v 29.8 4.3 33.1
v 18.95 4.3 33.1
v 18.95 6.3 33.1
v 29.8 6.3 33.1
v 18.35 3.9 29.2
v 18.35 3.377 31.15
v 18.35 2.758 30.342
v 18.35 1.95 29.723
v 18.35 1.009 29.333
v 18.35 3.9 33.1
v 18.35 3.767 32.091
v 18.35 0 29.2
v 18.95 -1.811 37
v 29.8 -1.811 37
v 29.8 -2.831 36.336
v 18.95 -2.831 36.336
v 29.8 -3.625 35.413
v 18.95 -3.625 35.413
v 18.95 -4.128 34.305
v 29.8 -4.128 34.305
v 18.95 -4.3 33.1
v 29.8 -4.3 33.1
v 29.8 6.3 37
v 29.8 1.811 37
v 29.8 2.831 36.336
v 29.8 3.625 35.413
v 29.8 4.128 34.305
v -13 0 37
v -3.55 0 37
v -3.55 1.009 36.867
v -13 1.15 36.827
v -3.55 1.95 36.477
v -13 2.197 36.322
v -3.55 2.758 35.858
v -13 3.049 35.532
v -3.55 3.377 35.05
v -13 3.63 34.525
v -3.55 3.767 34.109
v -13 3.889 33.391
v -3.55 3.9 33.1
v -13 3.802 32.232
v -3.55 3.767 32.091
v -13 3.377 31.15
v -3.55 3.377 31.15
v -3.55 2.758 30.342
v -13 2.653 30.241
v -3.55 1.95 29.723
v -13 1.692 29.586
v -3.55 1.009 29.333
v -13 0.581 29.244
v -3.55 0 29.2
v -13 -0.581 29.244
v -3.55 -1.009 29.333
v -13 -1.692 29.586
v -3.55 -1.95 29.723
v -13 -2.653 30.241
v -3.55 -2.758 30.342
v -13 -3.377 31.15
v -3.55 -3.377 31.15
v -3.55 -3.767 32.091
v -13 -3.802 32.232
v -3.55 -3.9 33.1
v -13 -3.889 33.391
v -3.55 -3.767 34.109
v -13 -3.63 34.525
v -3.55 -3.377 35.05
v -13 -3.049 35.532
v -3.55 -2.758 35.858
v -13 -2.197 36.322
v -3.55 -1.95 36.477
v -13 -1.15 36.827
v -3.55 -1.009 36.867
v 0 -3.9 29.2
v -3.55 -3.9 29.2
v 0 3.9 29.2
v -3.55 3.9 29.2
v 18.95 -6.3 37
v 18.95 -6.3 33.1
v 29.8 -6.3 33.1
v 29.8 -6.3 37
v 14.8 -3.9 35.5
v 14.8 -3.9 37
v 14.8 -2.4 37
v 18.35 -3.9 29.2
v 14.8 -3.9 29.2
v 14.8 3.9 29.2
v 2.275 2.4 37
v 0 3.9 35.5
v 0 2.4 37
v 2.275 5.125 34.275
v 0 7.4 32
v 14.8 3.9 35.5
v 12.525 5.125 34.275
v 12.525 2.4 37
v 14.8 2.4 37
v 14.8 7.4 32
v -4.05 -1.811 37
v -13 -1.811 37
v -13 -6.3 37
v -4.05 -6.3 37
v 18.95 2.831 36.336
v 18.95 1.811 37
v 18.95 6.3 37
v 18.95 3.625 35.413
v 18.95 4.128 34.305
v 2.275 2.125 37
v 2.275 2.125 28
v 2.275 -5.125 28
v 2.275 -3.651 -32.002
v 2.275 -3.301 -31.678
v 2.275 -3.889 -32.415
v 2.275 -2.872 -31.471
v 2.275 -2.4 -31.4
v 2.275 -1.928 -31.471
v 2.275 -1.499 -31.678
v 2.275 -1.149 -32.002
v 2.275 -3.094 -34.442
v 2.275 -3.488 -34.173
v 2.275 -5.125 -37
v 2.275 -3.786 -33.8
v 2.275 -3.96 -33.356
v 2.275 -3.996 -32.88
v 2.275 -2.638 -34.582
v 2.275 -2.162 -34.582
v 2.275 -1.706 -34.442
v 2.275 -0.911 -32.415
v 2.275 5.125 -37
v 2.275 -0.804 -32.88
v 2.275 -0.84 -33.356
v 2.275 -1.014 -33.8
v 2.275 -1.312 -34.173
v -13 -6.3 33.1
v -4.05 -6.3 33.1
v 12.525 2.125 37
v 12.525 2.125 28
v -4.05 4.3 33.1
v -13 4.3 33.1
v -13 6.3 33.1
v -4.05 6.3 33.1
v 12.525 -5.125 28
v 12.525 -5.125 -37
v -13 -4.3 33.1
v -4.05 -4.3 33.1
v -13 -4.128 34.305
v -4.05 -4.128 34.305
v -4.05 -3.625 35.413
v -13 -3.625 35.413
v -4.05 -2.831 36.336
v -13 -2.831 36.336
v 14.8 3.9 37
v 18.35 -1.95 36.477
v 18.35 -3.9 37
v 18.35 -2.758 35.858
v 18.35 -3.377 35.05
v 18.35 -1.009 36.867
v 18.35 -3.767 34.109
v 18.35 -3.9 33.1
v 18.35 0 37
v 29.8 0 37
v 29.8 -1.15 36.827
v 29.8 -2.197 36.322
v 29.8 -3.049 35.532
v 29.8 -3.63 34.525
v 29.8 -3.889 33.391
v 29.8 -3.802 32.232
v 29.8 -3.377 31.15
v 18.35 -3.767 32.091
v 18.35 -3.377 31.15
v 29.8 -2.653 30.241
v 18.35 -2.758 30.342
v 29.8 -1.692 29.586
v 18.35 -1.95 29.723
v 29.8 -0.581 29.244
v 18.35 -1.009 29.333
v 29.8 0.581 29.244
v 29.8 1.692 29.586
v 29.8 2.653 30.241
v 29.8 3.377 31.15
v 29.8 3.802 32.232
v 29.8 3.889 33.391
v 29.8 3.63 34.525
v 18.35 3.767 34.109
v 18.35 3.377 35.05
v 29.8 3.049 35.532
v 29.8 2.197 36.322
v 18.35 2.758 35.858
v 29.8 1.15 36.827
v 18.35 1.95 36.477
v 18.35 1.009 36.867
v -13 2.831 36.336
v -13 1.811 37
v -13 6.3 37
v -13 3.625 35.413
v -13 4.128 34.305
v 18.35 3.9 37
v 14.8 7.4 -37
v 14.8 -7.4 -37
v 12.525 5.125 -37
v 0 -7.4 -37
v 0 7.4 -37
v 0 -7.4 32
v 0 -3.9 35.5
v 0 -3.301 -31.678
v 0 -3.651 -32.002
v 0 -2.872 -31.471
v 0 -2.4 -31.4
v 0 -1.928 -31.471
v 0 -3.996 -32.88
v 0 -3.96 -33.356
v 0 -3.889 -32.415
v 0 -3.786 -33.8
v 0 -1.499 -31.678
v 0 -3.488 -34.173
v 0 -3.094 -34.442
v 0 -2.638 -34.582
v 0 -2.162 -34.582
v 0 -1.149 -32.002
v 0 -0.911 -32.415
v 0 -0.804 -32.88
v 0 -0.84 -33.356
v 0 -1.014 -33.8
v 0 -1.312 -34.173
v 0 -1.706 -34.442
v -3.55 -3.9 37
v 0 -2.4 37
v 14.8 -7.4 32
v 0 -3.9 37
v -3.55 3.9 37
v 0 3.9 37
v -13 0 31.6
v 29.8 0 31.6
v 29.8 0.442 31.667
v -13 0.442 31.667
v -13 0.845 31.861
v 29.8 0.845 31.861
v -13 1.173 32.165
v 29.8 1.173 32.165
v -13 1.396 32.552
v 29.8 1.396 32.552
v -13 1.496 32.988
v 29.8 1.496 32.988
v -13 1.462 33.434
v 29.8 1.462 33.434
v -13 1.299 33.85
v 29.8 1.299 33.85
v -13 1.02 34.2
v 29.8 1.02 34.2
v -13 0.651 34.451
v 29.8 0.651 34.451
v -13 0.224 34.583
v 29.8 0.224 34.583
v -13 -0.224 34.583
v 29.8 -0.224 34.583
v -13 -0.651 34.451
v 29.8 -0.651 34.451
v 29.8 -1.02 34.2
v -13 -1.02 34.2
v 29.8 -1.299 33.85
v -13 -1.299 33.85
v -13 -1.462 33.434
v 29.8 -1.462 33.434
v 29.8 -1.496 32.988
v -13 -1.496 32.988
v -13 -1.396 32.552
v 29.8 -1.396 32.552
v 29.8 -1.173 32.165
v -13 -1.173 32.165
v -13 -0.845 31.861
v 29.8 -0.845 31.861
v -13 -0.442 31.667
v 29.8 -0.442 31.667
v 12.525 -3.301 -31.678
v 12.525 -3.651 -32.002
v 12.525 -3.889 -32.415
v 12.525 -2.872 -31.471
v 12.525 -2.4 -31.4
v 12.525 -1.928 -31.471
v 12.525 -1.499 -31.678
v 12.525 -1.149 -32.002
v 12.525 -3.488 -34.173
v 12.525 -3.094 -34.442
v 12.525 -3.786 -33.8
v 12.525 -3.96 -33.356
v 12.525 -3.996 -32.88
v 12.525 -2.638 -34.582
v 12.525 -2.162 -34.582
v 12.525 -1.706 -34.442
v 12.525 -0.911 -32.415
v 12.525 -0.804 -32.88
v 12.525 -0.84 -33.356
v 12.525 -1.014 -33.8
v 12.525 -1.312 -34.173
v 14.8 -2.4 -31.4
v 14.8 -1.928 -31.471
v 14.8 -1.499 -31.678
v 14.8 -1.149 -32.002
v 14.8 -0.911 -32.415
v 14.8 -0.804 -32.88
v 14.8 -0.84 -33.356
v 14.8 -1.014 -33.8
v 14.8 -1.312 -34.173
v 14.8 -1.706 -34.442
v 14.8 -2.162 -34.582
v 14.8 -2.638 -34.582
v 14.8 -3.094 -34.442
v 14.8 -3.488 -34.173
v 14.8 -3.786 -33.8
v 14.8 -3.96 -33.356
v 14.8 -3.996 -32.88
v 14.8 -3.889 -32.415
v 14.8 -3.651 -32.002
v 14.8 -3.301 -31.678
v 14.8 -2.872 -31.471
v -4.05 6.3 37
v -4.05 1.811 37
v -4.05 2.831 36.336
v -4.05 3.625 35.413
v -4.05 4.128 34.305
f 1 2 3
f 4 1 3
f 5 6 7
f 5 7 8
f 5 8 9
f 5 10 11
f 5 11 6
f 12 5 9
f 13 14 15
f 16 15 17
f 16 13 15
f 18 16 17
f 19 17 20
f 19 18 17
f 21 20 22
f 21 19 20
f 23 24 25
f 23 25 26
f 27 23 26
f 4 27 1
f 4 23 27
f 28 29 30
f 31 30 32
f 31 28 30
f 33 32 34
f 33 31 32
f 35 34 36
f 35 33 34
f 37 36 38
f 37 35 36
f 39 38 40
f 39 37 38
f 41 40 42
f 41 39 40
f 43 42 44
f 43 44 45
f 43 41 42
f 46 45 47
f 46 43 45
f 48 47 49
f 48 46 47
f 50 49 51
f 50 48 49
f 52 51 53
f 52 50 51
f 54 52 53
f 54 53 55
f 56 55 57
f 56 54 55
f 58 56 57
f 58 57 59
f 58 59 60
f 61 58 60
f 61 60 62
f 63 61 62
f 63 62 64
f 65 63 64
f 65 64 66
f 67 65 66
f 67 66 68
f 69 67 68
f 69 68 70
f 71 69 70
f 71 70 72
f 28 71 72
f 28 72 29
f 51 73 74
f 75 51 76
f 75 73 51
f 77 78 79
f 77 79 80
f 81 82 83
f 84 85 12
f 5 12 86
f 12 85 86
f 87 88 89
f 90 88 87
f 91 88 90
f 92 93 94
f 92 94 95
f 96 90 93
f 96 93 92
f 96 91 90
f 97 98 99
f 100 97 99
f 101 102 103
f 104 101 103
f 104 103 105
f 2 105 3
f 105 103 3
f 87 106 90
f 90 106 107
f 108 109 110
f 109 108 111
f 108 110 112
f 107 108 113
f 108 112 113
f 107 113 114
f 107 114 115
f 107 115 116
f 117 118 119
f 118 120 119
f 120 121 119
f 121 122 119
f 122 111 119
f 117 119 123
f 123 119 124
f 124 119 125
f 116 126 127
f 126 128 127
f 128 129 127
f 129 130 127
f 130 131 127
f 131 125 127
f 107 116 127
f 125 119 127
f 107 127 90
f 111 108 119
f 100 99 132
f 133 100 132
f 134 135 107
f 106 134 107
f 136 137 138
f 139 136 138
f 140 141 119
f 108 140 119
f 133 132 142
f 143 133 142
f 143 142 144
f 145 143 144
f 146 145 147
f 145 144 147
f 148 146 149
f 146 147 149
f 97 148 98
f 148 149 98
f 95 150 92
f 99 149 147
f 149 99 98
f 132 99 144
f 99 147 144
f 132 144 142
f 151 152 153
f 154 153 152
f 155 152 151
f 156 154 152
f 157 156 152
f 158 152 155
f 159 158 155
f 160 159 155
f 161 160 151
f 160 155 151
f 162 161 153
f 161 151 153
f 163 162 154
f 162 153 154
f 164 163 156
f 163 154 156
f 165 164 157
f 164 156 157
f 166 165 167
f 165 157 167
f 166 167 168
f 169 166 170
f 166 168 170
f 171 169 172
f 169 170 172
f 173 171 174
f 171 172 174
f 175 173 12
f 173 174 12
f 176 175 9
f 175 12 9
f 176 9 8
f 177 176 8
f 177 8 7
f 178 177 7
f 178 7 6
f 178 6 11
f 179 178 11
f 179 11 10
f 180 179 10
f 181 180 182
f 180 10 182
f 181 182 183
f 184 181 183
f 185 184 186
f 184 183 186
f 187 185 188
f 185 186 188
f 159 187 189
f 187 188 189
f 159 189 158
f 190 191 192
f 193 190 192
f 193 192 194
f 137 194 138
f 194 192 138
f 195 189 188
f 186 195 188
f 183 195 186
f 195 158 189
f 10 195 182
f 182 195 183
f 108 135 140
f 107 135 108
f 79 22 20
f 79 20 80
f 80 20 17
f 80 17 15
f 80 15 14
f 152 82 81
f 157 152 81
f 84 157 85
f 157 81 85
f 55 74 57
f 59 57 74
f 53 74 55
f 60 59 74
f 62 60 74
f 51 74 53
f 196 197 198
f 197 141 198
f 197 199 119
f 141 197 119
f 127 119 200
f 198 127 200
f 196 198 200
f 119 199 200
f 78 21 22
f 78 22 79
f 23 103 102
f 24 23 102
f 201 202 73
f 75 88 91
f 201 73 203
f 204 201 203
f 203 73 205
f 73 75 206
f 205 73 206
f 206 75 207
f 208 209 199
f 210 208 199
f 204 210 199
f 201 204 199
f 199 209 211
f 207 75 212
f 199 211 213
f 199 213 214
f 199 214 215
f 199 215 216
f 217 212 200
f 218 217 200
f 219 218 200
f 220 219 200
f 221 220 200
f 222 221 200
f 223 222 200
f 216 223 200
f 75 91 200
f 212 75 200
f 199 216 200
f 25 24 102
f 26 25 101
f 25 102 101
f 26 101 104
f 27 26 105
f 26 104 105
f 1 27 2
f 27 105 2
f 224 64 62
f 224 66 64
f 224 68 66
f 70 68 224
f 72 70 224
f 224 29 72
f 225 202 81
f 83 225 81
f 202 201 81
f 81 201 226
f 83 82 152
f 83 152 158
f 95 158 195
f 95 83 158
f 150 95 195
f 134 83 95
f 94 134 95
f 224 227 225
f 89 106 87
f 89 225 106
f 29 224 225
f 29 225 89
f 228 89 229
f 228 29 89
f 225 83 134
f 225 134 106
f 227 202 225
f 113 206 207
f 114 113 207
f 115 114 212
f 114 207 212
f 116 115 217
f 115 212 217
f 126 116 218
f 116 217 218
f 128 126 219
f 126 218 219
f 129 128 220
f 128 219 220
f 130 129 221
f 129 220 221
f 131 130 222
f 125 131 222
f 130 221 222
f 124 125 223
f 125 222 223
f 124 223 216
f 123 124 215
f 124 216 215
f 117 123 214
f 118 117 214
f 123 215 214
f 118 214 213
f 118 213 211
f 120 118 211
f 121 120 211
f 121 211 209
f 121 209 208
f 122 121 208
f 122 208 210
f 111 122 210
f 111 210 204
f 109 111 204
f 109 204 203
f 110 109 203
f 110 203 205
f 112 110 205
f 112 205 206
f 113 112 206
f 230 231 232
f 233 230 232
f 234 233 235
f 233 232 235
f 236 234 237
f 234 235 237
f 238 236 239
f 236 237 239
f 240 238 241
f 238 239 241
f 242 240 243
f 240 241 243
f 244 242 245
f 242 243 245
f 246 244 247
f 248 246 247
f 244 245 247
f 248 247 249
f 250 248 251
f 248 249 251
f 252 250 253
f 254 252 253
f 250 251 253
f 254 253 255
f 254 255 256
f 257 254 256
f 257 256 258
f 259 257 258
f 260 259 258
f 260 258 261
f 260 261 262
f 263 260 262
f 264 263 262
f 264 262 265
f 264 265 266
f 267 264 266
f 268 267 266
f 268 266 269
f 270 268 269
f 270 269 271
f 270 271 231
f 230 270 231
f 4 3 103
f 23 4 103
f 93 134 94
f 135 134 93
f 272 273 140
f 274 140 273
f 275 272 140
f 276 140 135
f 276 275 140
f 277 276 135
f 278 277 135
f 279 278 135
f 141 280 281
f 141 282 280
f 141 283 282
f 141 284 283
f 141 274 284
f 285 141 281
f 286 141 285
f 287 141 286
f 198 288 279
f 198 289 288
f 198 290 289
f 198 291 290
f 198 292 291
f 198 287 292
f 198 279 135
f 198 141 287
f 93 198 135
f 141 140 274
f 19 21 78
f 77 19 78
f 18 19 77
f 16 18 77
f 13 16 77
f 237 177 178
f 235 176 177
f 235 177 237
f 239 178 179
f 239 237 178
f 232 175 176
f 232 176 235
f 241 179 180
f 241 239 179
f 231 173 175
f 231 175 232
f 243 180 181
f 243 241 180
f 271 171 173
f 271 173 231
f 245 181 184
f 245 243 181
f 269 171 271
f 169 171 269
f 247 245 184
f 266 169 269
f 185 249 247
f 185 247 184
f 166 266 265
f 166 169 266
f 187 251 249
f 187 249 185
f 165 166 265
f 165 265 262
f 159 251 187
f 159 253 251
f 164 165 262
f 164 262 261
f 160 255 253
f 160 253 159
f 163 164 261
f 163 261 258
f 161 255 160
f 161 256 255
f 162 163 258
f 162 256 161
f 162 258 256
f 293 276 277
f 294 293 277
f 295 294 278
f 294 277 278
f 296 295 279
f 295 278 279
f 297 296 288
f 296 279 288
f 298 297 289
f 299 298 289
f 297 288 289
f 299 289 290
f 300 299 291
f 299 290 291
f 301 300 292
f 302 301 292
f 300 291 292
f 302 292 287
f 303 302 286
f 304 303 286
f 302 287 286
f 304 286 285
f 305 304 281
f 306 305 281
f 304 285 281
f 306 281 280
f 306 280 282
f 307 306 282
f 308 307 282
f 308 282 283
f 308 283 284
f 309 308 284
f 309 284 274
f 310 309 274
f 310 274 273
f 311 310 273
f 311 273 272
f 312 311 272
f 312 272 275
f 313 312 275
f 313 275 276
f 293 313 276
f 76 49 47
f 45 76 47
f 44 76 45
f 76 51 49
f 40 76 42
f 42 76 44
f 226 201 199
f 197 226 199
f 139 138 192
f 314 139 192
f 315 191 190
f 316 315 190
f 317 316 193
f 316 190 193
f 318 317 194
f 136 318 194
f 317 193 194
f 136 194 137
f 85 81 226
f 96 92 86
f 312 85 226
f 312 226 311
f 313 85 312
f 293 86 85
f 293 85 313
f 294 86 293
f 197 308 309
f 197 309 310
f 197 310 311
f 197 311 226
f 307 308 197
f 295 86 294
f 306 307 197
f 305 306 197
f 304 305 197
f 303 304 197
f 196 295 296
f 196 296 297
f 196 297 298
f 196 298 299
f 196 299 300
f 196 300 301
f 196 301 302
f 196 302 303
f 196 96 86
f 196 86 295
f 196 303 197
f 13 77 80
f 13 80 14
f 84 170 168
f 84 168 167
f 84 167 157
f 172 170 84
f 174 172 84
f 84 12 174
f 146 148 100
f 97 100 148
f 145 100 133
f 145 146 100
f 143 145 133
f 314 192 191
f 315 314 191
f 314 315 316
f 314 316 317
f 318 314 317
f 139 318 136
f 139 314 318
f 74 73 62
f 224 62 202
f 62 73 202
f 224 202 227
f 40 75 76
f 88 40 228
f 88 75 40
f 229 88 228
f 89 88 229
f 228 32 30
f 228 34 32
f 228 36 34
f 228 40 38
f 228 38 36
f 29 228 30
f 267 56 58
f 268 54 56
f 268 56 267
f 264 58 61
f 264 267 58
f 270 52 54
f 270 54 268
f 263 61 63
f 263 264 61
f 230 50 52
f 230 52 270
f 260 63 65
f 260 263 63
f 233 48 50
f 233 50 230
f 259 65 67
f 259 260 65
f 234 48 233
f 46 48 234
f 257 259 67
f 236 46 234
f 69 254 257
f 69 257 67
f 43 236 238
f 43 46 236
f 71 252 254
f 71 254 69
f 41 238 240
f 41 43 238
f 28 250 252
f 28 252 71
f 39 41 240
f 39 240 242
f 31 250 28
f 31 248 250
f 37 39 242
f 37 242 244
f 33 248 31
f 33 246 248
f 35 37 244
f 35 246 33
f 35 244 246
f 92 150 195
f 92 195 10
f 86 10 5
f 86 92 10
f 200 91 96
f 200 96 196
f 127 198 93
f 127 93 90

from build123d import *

# Parameters (mm, degrees)
SKETCH_1_W            = 74
SKETCH_1_H            = 14.8
EXTRUDE_1_DEPTH       = 14.8
SKETCH_2_W            = 10.25
SKETCH_2_H            = 10.25
CUT_EXTRUDE_1_DEPTH   = 65
SKETCH_3_R            = 3.9
EXTRUDE_2_DEPTH       = 15
EXTRUDE_START         = 13
SKETCH_4_R            = 3.9
EXTRUDE_3_DEPTH       = 13
CHAMFER_1_SIZE        = 5
SKETCH_8_R            = 1.45
CUT_EXTRUDE_4_DEPTH   = 58.057865365
SKETCH_9_W            = 7.8
SKETCH_9_H            = 7.8
SKETCH_9_R            = 1.5
EXTRUDE_4_DEPTH       = 3.55
SKETCH_10_W           = 7.8
SKETCH_10_H           = 7.8
EXTRUDE_5_DEPTH       = 3.55
SKETCH1_R             = 1.6
CUT_EXTRUDE1_DEPTH    = 49.08118135
SKETCH2_R             = 1.5
CUT_EXTRUDE2_DEPTH    = 58.057865365
SKETCH3_W             = 10.25
SKETCH3_H             = 3
CUT_EXTRUDE3_DEPTH    = 72.887411972
BOSS_EXTRUDE1_DEPTH   = 8.95
BOSS_EXTRUDE1_2_DEPTH = 8.95
BOSS_EXTRUDE7_START   = 23
BOSS_EXTRUDE7_DEPTH   = 10.85
BOSS_EXTRUDE7_2_DEPTH = 10.85


with BuildPart() as part:
    # Эскиз1 → Бобышка-Вытянуть1 (new body)
    with BuildSketch(Plane(origin=(0, 0, 0), x_dir=(0, 0, -1), z_dir=(1, 0, 0))):
        Rectangle(SKETCH_1_W, SKETCH_1_H)
    extrude(amount=EXTRUDE_1_DEPTH)

    # Эскиз2 → Вырез-Вытянуть1 (cut)
    with BuildSketch(Plane(origin=(0, 0, -37), x_dir=(-1, 0, 0), z_dir=(0, 0, -1))):
        with Locations((-7.4, 0)):
            Rectangle(SKETCH_2_W, SKETCH_2_H)
    extrude(amount=-CUT_EXTRUDE_1_DEPTH, mode=Mode.SUBTRACT)

    # Эскиз3 → Бобышка-Вытянуть2 (add)
    with BuildSketch(Plane(origin=(14.8, 0, 0), x_dir=(0, 0, -1), z_dir=(1, 0, 0))):
        with Locations(Location((-33.1, 0, 0), (0, 0, 180))):
            Circle(SKETCH_3_R)
    extrude(amount=EXTRUDE_2_DEPTH)

    # Эскиз4 → Бобышка-Вытянуть3 (add)
    with BuildSketch(Plane.ZY.offset(EXTRUDE_START)):
        with Locations((33.1, 0)):
            Circle(SKETCH_4_R)
    extrude(amount=-EXTRUDE_3_DEPTH)

    # Фаска1
    chamfer_1_edges = [part.edges().sort_by_distance(p)[0] for p in [
        (7.4, 7.4, 37),
        (7.4, -7.4, 37),
    ]]
    chamfer(chamfer_1_edges, length=CHAMFER_1_SIZE)

    # Эскиз8 → Вырез-Вытянуть4 (cut, through all)
    with BuildSketch(Plane(origin=(29.8, 0, 0), x_dir=(0, 0, -1), z_dir=(1, 0, 0))):
        with Locations((-33.1, 0)):
            Circle(SKETCH_8_R)
    extrude(amount=-CUT_EXTRUDE_4_DEPTH, mode=Mode.SUBTRACT)

    # Эскиз9 → Бобышка-Вытянуть4 (add)
    with BuildSketch(Plane.ZY):
        with Locations((33.1, 0)):
            Rectangle(SKETCH_9_W, SKETCH_9_H)
        with Locations((33.1, 0)):
            Circle(SKETCH_9_R, mode=Mode.SUBTRACT)
    extrude(amount=EXTRUDE_4_DEPTH)

    # Эскиз10 → Бобышка-Вытянуть5 (add)
    with BuildSketch(Plane(origin=(14.8, 0, 0), x_dir=(0, 0, -1), z_dir=(1, 0, 0))):
        with Locations((-33.1, 0)):
            Rectangle(SKETCH_10_W, SKETCH_10_H)
    extrude(amount=EXTRUDE_5_DEPTH)

    # Sketch1 → Cut-Extrude1 (cut, through all)
    with BuildSketch(Plane.ZY):
        with Locations((-33, -2.4)):
            Circle(SKETCH1_R)
    extrude(amount=-CUT_EXTRUDE1_DEPTH, mode=Mode.SUBTRACT)

    # Sketch2 → Cut-Extrude2 (cut, through all)
    with BuildSketch(Plane(origin=(29.8, 0, 0), x_dir=(0, 0, -1), z_dir=(1, 0, 0))):
        with Locations((-33.1, 0)):
            Circle(SKETCH2_R)
    extrude(amount=-CUT_EXTRUDE2_DEPTH, mode=Mode.SUBTRACT)

    # Sketch3 → Cut-Extrude3 (cut, through all)
    with BuildSketch(Plane(origin=(0, 0, 28), x_dir=(-1, 0, 0), z_dir=(0, 0, -1))):
        with Locations((-7.4, 3.625)):
            Rectangle(SKETCH3_W, SKETCH3_H)
    extrude(amount=-CUT_EXTRUDE3_DEPTH, mode=Mode.SUBTRACT)


with BuildPart() as body_2:
    # Sketch4 → Boss-Extrude1 (new body)
    with BuildSketch(Plane.ZY.offset(13)):
        with BuildLine():
            Line((33.1, 4.3), (33.1, 6.3))
            Line((33.1, 6.3), (37, 6.3))
            Line((37, 6.3), (37, 1.811077028))
            ThreePointArc((37, 1.811077028), (35.413262715, 3.62475042), (33.1, 4.3))
        make_face()
    extrude(amount=-BOSS_EXTRUDE1_DEPTH)


with BuildPart() as body_3:
    # Sketch4 → Boss-Extrude1 2 (new body)
    with BuildSketch(Plane.ZY.offset(13)):
        with BuildLine():
            Line((37, -6.3), (33.1, -6.3))
            Line((33.1, -6.3), (33.1, -4.3))
            ThreePointArc((33.1, -4.3), (35.413262715, -3.62475042), (37, -1.811077028))
            Line((37, -1.811077028), (37, -6.3))
        make_face()
    extrude(amount=-BOSS_EXTRUDE1_2_DEPTH)


with BuildPart() as body_4:
    # Sketch8 → Boss-Extrude7 (new body)
    with BuildSketch(Plane(origin=(-4.05, 0, 0), x_dir=(0, 0, -1), z_dir=(1, 0, 0)).offset(BOSS_EXTRUDE7_START)):
        with BuildLine():
            Line((-33.1, -4.3), (-33.1, -6.3))
            Line((-33.1, -6.3), (-37, -6.3))
            Line((-37, -6.3), (-37, -1.811077028))
            ThreePointArc((-37, -1.811077028), (-35.413262715, -3.62475042), (-33.1, -4.3))
        make_face()
    extrude(amount=BOSS_EXTRUDE7_DEPTH)


with BuildPart() as body_5:
    # Sketch8 → Boss-Extrude7 2 (new body)
    with BuildSketch(Plane(origin=(-4.05, 0, 0), x_dir=(0, 0, -1), z_dir=(1, 0, 0)).offset(BOSS_EXTRUDE7_START)):
        with BuildLine():
            Line((-33.1, 4.3), (-33.1, 6.3))
            Line((-33.1, 6.3), (-37, 6.3))
            Line((-37, 6.3), (-37, 1.811077028))
            ThreePointArc((-37, 1.811077028), (-35.413262715, 3.62475042), (-33.1, 4.3))
        make_face()
    extrude(amount=BOSS_EXTRUDE7_2_DEPTH)


solid = Compound([part.part, body_2.part, body_3.part, body_4.part, body_5.part])
